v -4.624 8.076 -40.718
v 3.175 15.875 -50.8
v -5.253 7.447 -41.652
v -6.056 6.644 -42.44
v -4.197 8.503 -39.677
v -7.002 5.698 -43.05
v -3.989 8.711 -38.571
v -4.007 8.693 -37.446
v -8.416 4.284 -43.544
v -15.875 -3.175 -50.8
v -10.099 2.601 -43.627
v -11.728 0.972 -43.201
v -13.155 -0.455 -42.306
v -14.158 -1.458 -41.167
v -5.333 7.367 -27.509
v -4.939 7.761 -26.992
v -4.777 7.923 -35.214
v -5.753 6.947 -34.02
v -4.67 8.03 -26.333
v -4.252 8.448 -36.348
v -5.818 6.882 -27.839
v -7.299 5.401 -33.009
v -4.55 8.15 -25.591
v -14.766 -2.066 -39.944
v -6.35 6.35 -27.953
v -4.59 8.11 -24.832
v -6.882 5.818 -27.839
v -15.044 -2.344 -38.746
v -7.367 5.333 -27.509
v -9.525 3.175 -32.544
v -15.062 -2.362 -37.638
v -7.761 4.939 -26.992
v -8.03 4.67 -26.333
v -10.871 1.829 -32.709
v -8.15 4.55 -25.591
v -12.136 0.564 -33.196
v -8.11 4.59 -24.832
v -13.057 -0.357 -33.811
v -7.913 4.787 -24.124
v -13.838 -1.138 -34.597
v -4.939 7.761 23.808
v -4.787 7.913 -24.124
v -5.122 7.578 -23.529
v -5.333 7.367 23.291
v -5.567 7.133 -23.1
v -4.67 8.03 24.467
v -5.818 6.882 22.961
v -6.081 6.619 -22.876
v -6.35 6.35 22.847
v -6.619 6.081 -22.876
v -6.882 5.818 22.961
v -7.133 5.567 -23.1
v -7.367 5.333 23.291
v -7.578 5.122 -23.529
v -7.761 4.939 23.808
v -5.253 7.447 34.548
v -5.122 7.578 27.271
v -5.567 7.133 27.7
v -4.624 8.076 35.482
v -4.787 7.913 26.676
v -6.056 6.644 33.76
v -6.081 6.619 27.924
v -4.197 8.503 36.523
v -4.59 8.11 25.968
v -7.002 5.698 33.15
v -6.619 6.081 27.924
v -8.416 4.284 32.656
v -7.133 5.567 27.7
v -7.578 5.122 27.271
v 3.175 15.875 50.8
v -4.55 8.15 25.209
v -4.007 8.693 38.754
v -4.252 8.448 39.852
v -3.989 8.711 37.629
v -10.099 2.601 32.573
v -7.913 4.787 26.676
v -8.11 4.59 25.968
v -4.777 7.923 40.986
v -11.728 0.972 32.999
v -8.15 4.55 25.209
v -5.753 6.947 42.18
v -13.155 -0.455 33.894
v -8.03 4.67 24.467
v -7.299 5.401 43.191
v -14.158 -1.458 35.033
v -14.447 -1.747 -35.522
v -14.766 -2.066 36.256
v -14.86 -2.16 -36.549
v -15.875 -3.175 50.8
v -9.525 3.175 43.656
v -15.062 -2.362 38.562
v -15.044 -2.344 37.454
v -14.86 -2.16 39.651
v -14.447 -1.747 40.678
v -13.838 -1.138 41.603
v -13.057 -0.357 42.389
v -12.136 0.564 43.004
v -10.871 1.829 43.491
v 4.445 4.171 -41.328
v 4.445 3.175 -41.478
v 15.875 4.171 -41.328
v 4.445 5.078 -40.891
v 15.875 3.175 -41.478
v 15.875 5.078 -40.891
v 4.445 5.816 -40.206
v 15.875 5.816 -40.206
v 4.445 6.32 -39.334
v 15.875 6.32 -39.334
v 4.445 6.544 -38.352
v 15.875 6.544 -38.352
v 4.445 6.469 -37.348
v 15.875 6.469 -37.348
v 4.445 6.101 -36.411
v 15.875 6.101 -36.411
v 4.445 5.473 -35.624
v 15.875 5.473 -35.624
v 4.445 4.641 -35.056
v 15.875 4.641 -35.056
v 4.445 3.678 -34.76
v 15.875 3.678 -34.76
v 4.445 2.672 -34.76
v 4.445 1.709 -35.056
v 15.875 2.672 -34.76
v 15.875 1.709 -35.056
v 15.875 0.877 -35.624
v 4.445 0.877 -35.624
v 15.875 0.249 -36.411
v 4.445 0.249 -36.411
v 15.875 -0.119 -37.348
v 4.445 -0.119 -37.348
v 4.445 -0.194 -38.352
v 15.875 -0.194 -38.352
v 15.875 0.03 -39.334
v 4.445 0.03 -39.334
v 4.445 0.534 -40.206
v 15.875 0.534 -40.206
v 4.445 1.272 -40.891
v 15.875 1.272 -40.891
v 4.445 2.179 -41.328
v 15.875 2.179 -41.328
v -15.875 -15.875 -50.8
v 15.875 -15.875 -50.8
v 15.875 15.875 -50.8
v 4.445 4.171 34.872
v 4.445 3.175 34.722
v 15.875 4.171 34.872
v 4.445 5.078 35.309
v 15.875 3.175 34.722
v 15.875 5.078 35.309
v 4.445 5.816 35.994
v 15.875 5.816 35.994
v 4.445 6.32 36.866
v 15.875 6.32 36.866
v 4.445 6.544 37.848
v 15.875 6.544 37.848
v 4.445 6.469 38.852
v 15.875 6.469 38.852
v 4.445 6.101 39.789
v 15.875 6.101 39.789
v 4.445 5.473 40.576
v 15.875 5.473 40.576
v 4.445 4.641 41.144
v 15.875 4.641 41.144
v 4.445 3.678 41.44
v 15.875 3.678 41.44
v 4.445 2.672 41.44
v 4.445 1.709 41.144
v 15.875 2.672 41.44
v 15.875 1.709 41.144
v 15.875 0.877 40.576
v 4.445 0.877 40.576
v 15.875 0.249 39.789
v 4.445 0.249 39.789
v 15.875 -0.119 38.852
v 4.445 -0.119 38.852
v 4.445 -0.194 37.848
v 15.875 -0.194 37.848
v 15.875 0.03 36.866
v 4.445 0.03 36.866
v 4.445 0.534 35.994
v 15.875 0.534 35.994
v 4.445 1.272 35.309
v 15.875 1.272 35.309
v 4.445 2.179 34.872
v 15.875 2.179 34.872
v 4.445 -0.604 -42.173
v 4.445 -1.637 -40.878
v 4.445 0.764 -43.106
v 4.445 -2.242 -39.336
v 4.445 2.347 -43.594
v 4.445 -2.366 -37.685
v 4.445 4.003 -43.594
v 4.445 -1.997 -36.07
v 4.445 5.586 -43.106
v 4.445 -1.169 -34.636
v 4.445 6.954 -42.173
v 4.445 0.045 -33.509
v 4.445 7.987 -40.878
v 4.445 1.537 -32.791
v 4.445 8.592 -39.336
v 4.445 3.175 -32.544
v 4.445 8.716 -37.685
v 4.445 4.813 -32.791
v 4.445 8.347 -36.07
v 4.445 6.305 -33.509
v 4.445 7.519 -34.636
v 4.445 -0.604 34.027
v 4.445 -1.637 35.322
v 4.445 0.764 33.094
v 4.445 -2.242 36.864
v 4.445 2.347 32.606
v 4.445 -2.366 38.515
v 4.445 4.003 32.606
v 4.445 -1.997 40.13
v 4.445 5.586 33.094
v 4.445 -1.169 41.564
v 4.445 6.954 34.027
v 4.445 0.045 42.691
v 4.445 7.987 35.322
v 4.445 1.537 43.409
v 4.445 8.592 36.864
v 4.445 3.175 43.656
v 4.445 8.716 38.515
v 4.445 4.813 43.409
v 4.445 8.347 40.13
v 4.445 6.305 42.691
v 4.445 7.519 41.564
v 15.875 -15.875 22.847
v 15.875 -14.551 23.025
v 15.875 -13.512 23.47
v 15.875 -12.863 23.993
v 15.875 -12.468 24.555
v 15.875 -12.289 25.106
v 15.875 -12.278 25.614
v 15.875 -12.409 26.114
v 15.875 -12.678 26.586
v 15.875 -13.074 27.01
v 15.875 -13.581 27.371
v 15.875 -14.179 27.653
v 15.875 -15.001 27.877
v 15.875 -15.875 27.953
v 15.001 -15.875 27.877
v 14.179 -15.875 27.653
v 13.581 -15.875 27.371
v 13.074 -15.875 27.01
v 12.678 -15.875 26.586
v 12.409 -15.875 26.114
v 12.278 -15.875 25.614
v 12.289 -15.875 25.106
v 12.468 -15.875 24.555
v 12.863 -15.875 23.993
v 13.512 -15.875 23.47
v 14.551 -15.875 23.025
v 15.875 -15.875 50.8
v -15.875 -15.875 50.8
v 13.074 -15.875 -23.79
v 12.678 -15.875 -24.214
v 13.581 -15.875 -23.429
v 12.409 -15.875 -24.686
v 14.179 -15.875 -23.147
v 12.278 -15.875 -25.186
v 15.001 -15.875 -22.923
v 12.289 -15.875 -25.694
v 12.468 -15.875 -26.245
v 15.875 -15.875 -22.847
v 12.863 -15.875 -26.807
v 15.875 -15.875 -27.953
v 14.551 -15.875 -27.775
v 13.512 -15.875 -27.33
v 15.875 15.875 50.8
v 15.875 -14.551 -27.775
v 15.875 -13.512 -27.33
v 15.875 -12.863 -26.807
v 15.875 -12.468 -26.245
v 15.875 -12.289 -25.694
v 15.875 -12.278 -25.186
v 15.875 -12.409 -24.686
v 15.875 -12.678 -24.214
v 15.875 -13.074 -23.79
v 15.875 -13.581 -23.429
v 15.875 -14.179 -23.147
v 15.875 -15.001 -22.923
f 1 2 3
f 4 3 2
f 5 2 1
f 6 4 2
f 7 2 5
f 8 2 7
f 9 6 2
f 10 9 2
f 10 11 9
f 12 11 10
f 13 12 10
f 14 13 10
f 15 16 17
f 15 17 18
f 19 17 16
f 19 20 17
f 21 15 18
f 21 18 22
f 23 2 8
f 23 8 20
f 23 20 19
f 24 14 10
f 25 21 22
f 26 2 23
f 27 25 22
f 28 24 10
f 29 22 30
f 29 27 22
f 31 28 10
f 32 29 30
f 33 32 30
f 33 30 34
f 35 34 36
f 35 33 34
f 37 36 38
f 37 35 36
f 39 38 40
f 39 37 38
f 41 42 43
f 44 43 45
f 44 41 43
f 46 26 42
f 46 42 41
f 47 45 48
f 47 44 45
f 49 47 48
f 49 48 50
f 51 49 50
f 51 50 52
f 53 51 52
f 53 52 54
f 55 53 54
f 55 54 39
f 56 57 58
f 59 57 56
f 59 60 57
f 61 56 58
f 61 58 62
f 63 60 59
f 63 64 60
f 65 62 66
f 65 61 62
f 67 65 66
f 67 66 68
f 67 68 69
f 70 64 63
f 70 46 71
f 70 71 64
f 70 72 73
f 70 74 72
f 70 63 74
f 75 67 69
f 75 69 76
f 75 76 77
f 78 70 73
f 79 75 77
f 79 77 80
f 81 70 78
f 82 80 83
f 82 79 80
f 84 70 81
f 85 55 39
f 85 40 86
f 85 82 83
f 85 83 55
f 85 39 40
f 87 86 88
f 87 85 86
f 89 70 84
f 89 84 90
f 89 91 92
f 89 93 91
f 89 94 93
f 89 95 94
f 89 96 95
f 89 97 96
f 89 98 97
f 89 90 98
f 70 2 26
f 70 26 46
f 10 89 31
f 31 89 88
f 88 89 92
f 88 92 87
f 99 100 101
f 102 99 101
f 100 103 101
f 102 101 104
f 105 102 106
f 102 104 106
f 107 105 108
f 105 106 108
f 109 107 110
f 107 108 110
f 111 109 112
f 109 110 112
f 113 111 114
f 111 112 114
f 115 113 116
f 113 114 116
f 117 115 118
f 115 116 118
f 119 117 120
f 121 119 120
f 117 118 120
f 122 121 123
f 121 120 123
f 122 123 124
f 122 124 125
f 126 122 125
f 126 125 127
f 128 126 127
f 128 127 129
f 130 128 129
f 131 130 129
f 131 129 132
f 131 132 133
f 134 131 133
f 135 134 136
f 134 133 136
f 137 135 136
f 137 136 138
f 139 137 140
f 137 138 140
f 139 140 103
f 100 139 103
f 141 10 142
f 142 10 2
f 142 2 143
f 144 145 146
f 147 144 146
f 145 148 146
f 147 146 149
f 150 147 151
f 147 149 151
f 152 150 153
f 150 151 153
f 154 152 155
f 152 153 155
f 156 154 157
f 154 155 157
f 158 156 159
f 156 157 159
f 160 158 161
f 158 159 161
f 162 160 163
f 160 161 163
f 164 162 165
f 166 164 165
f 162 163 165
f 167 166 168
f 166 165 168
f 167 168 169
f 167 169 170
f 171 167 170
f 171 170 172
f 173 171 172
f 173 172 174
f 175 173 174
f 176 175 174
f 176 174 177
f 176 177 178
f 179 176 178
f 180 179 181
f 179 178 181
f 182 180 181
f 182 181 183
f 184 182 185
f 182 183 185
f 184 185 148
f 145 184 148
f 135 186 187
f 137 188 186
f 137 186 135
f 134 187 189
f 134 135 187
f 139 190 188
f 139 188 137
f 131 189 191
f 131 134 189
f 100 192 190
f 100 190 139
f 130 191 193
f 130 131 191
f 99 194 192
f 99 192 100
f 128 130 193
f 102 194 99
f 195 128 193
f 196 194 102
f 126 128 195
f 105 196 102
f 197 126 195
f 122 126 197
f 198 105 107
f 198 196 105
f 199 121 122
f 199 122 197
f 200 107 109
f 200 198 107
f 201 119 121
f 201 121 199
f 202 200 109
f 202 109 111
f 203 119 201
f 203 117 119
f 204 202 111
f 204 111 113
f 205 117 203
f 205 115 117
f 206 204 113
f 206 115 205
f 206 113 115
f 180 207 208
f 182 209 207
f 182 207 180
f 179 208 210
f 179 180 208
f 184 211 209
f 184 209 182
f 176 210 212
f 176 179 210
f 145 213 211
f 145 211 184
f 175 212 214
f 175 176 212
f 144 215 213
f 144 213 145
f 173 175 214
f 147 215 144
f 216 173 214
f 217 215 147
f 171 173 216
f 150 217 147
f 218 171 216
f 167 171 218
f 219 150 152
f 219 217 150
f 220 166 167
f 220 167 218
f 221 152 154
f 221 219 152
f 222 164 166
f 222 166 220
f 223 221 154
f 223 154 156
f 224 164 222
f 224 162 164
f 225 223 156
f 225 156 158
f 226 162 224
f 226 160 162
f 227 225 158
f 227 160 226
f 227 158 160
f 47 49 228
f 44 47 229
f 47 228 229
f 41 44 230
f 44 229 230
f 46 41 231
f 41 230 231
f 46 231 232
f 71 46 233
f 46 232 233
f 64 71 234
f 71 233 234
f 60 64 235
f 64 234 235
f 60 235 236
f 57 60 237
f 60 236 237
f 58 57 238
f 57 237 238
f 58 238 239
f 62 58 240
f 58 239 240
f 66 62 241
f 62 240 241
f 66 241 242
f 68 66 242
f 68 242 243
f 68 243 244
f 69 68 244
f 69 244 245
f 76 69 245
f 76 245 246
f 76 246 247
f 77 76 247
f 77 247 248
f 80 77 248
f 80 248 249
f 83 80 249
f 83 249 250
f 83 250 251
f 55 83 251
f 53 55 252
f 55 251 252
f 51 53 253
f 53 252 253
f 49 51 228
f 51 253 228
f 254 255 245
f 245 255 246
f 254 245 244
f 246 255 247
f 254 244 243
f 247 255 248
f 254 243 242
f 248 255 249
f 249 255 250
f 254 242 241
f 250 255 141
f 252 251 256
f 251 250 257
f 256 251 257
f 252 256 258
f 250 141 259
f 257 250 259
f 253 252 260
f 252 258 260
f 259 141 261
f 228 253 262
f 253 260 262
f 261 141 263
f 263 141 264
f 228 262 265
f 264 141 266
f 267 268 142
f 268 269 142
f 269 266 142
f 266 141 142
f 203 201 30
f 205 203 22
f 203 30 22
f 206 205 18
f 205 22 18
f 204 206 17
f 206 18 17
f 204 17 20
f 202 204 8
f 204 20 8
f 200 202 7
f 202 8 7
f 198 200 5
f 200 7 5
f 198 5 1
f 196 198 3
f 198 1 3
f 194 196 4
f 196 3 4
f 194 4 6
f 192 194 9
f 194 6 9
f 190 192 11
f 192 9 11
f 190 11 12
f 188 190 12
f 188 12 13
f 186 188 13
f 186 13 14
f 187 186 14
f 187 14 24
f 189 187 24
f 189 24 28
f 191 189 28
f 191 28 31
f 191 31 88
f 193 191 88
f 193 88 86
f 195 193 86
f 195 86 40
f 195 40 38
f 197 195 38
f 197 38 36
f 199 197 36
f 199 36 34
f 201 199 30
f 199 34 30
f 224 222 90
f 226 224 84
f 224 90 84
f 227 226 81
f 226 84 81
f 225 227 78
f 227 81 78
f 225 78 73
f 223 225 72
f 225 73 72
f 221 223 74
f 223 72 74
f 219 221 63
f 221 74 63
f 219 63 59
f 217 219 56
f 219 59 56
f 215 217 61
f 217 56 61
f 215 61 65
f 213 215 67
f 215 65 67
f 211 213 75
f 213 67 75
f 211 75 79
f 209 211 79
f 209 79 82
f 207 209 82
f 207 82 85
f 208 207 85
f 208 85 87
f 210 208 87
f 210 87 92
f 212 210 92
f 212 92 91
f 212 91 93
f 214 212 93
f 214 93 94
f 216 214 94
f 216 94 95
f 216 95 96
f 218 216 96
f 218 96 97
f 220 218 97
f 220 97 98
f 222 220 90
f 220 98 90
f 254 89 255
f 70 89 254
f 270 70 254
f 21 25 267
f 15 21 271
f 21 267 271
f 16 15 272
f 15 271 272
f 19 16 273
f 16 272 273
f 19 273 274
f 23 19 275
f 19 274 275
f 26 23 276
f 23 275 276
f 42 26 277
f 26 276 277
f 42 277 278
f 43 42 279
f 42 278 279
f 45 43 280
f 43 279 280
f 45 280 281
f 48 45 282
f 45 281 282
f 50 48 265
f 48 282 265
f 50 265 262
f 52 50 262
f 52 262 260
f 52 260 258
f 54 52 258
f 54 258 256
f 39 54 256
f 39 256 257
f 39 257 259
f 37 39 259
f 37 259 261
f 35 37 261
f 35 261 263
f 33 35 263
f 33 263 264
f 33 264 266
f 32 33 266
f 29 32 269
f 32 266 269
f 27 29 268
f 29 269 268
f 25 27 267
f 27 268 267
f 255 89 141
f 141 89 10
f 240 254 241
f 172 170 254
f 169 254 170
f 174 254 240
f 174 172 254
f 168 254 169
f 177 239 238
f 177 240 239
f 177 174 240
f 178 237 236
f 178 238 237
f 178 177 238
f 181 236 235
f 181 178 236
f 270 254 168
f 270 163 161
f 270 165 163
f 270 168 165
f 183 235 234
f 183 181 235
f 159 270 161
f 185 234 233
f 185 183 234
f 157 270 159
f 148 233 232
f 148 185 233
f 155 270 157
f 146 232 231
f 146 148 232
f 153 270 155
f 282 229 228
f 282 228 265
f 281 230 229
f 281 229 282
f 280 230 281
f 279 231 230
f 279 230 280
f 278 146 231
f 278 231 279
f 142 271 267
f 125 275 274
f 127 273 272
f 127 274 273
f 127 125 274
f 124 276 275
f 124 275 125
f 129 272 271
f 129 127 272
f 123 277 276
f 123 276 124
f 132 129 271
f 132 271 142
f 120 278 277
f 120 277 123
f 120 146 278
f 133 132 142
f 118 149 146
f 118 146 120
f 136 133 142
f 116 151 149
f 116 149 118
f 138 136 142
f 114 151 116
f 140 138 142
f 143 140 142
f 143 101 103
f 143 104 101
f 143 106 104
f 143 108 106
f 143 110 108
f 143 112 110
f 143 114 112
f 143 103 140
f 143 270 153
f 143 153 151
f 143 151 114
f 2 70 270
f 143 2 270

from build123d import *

# Parameters (mm, degrees)
SKETCH1_W                                        = 31.75
SKETCH1_H                                        = 101.6
BOSS_EXTRUDE1_DEPTH                              = 15.875
CUT_EXTRUDE1_REACH                               = 106.051
F_1_4_20_TAPPED_HOLE1_D                          = 5.1054
CBORE_FOR_1_4_SOCKET_HEAD_CAP_SCREW1_D           = 6.7564
CBORE_FOR_1_4_SOCKET_HEAD_CAP_SCREW1_CBORE_D     = 11.1125
CBORE_FOR_1_4_SOCKET_HEAD_CAP_SCREW1_CBORE_DEPTH = 20.32


with BuildPart() as part:
    # Sketch1 → Boss-Extrude1 (new, symmetric)
    with BuildSketch(Plane(origin=(0, 0, 0), x_dir=(1, 0, 0), z_dir=(0, 1, 0))):
        Rectangle(SKETCH1_W, SKETCH1_H)
    extrude(amount=BOSS_EXTRUDE1_DEPTH, both=True)

    # Sketch2 → Cut-Extrude1 (cut, up to next)
    with BuildSketch(Plane.XY.offset(50.8), mode=Mode.PRIVATE) as cut_extrude1_sk1:
        Polygon((-15.875, -3.175), (-15.875, 15.875), (3.175, 15.875), align=None)
    cut_extrude1_tool1 = extrude(cut_extrude1_sk1.sketch, amount=-CUT_EXTRUDE1_REACH, mode=Mode.PRIVATE) & part.part
    add(cut_extrude1_tool1.solids().sort_by_distance((-9.525, 9.525, 50.8))[0], mode=Mode.SUBTRACT)

    # 1/4-20 Tapped Hole1 (through all)
    with Locations(Plane(origin=(-6.35, 6.35, 0), x_dir=(0, 0, 1), z_dir=(-0.7071067811865513, 0.7071067811865438, 0))):
        with Locations((-25.4, 0), (25.4, 0)):
            Hole(F_1_4_20_TAPPED_HOLE1_D / 2)

    # CBORE for 1/4 Socket Head Cap Screw1 (through all)
    with Locations(Plane.ZY.offset(15.875)):
        with Locations((-38.1, 3.175), (38.1, 3.175)):
            CounterBoreHole(CBORE_FOR_1_4_SOCKET_HEAD_CAP_SCREW1_D / 2, CBORE_FOR_1_4_SOCKET_HEAD_CAP_SCREW1_CBORE_D / 2, CBORE_FOR_1_4_SOCKET_HEAD_CAP_SCREW1_CBORE_DEPTH)


solid = part.part
